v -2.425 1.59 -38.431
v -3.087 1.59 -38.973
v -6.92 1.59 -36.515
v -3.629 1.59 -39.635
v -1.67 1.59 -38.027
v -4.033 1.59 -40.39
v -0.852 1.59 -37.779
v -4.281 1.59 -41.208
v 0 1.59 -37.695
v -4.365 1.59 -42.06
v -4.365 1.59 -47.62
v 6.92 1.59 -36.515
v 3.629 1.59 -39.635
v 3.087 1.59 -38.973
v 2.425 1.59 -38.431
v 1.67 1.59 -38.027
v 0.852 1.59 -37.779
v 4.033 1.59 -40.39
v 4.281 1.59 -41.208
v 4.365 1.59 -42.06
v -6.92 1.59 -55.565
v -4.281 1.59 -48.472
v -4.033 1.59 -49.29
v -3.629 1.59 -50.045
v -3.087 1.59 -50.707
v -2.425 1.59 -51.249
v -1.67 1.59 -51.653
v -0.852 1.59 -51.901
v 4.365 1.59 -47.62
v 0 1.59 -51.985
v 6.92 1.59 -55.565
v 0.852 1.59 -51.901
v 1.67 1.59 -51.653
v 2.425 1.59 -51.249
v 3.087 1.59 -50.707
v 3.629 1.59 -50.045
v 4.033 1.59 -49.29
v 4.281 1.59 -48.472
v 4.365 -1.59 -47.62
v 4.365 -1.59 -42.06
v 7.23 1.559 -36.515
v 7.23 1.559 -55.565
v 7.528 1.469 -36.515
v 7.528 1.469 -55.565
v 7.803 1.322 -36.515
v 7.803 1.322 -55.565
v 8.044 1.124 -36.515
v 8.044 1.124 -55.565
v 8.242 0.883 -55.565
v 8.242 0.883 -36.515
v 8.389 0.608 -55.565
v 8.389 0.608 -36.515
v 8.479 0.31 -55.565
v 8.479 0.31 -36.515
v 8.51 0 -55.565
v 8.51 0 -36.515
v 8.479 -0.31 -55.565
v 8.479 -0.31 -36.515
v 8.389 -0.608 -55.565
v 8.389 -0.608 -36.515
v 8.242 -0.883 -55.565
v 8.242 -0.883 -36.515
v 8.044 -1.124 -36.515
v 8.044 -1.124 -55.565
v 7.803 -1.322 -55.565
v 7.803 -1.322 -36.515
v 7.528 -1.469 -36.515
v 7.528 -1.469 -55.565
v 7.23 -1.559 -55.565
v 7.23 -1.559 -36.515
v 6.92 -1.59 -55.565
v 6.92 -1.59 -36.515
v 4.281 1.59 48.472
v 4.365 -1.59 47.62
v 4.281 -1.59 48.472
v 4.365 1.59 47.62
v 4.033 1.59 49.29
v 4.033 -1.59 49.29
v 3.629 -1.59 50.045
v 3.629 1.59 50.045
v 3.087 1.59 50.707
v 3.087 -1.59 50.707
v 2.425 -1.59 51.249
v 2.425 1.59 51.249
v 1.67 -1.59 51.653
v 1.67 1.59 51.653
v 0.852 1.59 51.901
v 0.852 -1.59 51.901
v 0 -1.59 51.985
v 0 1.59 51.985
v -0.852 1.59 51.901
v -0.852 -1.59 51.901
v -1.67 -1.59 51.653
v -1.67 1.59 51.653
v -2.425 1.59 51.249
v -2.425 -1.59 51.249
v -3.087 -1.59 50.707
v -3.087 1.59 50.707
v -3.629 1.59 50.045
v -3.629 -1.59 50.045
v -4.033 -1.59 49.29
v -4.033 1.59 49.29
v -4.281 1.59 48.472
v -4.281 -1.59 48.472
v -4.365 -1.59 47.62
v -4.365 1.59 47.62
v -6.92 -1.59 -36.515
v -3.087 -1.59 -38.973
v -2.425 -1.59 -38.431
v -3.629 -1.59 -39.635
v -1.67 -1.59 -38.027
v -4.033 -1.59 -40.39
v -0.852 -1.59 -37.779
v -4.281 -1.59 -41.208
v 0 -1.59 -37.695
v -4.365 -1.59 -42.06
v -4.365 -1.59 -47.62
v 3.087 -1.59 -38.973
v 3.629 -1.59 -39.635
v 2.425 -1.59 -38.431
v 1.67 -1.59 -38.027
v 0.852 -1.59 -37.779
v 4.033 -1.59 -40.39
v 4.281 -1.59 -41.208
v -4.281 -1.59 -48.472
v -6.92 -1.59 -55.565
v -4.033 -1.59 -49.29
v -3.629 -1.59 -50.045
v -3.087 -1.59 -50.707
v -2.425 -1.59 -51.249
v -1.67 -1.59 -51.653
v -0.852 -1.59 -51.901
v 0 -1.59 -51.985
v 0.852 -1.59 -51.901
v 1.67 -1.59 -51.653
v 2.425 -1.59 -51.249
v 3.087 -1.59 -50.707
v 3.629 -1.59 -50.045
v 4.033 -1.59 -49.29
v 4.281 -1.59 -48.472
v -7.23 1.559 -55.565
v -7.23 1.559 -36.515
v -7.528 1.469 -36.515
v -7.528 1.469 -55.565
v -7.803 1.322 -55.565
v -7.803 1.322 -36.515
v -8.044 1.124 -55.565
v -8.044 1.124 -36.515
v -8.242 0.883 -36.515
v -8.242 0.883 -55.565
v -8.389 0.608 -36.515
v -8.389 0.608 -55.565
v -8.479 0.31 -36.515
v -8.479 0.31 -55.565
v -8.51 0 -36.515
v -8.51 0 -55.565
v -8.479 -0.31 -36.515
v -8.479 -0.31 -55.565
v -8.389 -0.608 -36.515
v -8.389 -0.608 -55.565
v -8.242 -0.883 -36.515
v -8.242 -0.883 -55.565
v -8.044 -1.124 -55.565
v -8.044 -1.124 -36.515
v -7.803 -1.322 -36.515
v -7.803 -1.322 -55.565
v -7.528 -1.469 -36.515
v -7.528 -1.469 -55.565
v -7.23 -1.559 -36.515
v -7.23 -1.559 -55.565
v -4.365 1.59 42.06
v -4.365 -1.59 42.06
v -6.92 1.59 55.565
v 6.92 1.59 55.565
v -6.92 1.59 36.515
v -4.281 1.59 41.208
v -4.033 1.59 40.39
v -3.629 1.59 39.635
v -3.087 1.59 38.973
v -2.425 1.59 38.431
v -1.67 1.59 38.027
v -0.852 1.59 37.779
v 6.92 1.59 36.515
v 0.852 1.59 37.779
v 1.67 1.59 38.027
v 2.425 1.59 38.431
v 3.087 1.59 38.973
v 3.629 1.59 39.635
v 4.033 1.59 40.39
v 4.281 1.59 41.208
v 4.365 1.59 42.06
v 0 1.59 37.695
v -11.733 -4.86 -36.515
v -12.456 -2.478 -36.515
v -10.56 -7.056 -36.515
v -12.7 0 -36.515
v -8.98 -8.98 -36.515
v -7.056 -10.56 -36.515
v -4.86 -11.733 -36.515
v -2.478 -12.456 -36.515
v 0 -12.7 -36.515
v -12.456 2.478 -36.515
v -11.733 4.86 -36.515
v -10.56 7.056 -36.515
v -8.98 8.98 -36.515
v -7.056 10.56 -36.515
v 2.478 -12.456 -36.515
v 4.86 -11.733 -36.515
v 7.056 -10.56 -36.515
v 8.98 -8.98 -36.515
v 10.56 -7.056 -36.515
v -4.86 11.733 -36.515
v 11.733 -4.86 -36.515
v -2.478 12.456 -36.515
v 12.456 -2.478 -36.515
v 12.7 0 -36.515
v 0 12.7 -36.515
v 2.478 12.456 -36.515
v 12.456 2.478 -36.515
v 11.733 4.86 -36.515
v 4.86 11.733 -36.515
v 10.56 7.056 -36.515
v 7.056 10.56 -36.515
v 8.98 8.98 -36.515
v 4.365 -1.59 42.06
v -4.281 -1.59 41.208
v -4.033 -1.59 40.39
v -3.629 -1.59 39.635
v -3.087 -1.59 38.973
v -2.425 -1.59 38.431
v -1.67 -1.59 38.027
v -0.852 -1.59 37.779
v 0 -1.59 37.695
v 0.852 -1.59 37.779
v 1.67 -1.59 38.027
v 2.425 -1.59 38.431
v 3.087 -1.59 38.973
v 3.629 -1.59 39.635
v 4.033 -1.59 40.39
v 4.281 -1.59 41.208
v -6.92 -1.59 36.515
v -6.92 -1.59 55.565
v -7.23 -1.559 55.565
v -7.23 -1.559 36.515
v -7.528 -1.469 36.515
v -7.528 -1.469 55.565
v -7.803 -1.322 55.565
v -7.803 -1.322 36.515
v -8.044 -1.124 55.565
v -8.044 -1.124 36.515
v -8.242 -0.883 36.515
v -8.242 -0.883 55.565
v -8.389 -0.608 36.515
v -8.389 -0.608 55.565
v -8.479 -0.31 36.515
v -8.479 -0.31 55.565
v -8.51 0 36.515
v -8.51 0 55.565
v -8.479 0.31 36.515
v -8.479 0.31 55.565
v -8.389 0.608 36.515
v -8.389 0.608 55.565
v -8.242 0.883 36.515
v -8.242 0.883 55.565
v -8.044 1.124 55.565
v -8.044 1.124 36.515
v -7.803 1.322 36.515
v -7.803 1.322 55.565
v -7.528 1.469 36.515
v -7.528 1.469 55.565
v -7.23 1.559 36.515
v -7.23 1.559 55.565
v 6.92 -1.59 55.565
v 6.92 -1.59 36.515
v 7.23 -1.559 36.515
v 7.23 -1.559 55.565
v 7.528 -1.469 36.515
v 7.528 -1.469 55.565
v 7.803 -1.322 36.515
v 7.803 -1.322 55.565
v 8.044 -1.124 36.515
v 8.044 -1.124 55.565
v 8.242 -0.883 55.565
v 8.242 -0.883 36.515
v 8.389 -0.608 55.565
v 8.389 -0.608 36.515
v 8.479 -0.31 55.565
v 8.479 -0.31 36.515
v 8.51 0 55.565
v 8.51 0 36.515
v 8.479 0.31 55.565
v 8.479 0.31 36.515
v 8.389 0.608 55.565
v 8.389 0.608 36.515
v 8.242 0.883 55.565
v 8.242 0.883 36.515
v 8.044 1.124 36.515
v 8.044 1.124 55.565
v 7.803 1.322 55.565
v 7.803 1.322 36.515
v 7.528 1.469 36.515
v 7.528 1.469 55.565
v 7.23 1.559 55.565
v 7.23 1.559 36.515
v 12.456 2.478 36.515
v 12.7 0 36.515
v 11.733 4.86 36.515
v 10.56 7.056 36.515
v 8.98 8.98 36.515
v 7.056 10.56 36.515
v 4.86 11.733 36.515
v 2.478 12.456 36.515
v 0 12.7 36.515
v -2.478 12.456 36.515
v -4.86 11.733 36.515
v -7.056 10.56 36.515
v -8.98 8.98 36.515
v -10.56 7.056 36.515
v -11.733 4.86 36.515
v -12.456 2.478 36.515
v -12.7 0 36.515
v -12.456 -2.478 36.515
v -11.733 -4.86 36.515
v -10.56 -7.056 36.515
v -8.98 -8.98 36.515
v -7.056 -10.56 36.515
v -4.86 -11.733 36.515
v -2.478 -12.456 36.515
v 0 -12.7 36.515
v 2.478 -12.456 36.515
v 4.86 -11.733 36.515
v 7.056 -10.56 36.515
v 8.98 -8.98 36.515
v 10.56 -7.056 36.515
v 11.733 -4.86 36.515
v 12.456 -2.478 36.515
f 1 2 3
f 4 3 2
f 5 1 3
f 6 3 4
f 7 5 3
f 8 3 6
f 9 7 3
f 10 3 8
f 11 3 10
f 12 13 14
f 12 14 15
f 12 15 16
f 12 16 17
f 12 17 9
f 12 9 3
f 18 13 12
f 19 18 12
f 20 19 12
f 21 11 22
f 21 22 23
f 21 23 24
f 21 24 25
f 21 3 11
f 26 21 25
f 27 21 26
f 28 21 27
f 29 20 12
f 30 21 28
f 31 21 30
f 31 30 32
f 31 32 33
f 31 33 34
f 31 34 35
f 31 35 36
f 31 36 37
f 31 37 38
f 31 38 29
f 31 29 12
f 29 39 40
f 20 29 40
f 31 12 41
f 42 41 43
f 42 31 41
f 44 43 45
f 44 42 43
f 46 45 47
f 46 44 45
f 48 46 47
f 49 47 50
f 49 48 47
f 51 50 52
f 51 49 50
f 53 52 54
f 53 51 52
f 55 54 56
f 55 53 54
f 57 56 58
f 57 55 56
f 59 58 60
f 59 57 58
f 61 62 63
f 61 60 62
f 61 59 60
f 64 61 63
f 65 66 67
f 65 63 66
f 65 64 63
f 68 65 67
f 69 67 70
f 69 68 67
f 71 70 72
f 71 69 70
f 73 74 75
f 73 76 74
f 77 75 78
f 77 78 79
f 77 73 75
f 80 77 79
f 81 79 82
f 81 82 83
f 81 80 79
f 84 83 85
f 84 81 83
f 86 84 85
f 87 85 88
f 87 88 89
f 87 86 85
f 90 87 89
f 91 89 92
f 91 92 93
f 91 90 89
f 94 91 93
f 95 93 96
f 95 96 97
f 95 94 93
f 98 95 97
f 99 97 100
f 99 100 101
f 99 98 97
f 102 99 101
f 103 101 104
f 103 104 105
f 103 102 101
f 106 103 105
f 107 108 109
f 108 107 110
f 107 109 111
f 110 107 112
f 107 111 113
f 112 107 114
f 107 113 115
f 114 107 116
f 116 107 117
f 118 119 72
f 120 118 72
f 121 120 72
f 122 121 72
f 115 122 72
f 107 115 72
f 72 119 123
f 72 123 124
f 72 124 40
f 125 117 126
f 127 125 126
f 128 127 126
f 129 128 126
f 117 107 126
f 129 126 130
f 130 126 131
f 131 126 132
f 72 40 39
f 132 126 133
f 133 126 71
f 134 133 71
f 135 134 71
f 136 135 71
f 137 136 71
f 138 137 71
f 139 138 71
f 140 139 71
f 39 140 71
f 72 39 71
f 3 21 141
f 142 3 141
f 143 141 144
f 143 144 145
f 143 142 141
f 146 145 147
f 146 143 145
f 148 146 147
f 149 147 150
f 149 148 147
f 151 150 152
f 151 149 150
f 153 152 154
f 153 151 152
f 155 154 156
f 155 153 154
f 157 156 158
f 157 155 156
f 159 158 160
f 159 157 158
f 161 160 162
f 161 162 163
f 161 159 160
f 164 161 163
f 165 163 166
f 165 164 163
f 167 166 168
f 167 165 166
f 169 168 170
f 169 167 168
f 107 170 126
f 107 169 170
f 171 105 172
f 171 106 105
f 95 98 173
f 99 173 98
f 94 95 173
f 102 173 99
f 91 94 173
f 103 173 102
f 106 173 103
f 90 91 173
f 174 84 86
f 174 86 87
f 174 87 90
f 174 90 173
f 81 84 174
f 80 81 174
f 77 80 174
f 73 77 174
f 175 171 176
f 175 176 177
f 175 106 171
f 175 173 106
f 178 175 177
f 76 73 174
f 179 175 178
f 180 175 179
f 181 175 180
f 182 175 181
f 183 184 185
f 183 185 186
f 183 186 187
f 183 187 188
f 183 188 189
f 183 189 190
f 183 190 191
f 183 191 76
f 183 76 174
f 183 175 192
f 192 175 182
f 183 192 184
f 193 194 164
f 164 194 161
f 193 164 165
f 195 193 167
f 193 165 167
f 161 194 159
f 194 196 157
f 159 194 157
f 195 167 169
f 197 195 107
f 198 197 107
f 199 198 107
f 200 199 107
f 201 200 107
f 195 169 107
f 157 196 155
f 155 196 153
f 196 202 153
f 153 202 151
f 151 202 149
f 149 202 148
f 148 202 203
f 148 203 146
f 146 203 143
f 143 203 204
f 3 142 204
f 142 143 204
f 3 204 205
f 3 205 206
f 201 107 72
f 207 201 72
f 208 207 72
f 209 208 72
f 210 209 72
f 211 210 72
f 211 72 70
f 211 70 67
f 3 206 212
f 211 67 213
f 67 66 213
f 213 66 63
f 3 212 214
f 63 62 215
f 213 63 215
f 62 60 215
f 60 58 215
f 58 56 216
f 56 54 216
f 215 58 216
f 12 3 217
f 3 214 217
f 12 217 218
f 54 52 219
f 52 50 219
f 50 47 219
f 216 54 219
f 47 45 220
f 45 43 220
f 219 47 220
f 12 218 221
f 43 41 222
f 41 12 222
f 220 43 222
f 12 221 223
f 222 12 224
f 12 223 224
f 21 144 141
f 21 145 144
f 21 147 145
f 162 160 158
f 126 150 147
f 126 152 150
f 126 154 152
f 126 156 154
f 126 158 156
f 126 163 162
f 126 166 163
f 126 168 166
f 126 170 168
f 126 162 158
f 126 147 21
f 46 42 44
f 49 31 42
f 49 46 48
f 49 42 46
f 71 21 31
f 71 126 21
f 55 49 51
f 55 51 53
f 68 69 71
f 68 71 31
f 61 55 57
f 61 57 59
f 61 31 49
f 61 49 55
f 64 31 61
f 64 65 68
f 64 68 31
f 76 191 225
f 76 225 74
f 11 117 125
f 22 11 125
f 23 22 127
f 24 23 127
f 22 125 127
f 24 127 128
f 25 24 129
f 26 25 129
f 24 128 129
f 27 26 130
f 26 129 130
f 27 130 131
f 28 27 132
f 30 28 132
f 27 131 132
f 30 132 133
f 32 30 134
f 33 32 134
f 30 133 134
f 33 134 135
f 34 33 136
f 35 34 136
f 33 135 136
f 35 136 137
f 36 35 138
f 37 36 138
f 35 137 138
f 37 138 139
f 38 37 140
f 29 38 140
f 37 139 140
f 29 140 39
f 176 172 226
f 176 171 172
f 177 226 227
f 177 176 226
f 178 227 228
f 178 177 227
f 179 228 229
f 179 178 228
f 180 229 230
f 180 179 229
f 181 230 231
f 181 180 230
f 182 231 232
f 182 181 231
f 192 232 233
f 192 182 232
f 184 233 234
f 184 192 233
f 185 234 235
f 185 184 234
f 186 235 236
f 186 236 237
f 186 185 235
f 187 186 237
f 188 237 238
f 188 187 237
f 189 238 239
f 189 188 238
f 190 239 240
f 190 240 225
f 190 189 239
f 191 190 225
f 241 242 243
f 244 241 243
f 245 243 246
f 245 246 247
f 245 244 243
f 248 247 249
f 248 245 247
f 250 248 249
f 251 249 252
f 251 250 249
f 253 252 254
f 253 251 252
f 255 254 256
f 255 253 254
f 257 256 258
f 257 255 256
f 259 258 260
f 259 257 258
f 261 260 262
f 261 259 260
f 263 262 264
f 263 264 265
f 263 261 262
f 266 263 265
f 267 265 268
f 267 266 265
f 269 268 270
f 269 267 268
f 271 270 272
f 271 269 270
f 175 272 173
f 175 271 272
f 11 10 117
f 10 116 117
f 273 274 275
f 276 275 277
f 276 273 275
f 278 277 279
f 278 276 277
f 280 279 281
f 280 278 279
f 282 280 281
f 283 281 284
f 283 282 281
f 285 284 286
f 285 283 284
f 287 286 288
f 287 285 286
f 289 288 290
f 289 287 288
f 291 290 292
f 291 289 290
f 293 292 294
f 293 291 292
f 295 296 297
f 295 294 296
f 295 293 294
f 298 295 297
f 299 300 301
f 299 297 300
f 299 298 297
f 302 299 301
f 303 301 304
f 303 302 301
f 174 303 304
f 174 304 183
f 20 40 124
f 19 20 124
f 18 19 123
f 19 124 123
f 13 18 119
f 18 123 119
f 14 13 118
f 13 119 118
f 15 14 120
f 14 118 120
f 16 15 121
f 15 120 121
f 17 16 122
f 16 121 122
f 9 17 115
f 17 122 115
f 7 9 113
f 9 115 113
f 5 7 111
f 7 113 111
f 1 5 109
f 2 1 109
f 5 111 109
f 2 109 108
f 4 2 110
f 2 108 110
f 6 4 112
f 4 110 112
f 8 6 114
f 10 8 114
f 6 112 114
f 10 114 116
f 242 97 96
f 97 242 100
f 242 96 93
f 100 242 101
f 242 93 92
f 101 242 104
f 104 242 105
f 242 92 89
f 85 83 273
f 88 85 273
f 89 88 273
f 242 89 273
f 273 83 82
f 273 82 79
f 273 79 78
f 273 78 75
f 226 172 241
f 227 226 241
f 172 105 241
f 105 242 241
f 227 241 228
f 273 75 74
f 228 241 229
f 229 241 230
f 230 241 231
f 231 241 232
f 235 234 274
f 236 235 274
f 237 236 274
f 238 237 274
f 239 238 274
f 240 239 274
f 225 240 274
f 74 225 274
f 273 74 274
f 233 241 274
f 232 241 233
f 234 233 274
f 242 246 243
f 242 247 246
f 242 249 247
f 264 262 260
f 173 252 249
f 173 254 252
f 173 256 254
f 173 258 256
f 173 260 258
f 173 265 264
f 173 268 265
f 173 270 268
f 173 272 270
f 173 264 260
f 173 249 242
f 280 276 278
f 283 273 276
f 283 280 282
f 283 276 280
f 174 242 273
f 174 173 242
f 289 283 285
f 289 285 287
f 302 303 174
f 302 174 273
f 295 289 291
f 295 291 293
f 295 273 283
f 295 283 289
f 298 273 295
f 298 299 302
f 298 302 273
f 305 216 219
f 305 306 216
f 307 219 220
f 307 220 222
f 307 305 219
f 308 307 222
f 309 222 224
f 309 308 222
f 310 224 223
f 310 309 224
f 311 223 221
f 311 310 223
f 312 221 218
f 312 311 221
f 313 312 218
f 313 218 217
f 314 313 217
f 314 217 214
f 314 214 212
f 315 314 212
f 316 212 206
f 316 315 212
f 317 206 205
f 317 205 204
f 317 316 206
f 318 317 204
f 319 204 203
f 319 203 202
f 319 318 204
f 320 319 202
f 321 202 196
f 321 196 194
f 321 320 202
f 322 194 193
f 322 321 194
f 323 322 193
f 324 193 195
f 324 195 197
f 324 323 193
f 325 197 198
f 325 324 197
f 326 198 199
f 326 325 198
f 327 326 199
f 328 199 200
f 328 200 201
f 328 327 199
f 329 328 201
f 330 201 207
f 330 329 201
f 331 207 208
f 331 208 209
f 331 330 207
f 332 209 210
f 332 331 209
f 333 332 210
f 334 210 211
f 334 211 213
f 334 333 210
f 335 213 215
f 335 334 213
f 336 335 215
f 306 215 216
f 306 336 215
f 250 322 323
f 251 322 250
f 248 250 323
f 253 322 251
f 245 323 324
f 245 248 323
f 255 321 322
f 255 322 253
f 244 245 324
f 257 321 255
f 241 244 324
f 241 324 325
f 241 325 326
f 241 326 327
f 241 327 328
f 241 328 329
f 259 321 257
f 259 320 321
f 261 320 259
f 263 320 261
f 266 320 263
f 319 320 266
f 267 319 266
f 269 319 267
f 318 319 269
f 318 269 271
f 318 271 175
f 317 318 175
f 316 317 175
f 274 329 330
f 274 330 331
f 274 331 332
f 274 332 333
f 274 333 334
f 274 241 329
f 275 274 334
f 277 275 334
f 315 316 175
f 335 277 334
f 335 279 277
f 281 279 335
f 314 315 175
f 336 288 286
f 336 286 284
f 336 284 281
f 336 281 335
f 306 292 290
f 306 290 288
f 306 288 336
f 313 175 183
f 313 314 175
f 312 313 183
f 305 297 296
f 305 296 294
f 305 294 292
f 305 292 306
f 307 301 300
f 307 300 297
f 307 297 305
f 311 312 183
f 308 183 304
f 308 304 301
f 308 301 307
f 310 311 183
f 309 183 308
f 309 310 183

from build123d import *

# Parameters (mm, degrees)
SKETCH1_R           = 12.7
BOSS_EXTRUDE1_DEPTH = 36.515
SKETCH2_W           = 17.02
SKETCH2_H           = 19.05
BOSS_EXTRUDE2_DEPTH = 1.59
FILLET1_RADIUS      = 1.59
FILLET1_LENGTH      = 19.05
FILLET2_RADIUS      = 1.59
FILLET2_LENGTH      = 19.05
FILLET3_RADIUS      = 1.59
FILLET3_LENGTH      = 19.05
FILLET4_RADIUS      = 1.59
FILLET4_LENGTH      = 19.05


with BuildPart() as part:
    # Sketch1 → Boss-Extrude1 (new, symmetric)
    with BuildSketch(Plane.XY):
        Circle(SKETCH1_R)
    extrude(amount=BOSS_EXTRUDE1_DEPTH, both=True)

    # Sketch2 → Boss-Extrude2 (add, symmetric)
    # profile 1 of 2: a face of its own
    with BuildSketch(Plane(origin=(0, 0, 0), x_dir=(1, 0, 0), z_dir=(0, 1, 0))):
        with Locations((0, 46.04)):
            Rectangle(SKETCH2_W, SKETCH2_H)
        with BuildLine():
            Line((-4.365, 42.06), (-4.365, 47.62))
            ThreePointArc((-4.365, 47.62), (0, 51.985), (4.365, 47.62))
            Line((4.365, 47.62), (4.365, 42.06))
            ThreePointArc((4.365, 42.06), (0, 37.695), (-4.365, 42.06))
        make_face(mode=Mode.SUBTRACT)
    # profile 2 of 2: a face of its own
    with BuildSketch(Plane(origin=(0, 0, 0), x_dir=(1, 0, 0), z_dir=(0, 1, 0))):
        with Locations((0, -46.04)):
            Rectangle(SKETCH2_W, SKETCH2_H)
        with BuildLine():
            Line((4.365, -42.06), (4.365, -47.62))
            ThreePointArc((4.365, -47.62), (0, -51.985), (-4.365, -47.62))
            Line((-4.365, -47.62), (-4.365, -42.06))
            ThreePointArc((-4.365, -42.06), (0, -37.695), (4.365, -42.06))
        make_face(mode=Mode.SUBTRACT)
    extrude(amount=BOSS_EXTRUDE2_DEPTH, both=True)

    # Fillet1: full round fillet: the end face becomes a half cylinder, R = half its width
    fillet1_face = Plane((-8.51, 0, -46.04), x_dir=(0, 0, 1), z_dir=(-1, 0, 0))  # on the end face: x along it, z out of the body
    fillet1_slab = fillet1_face.offset(-FILLET1_RADIUS / 2) * Box(FILLET1_LENGTH, 2 * FILLET1_RADIUS, FILLET1_RADIUS, mode=Mode.PRIVATE)  # the body's end, R deep
    fillet1_round = Plane((-6.92, 0, -46.04), x_dir=(-1, 0, 0), z_dir=(0, 0, 1)) * Cylinder(FILLET1_RADIUS, FILLET1_LENGTH, mode=Mode.PRIVATE)  # its axis R under the face
    add(fillet1_slab - fillet1_round, mode=Mode.SUBTRACT)

    # Fillet2: full round fillet: the end face becomes a half cylinder, R = half its width
    fillet2_face = Plane((8.51, 0, -46.04), x_dir=(0, 0, -1), z_dir=(1, 0, 0))  # on the end face: x along it, z out of the body
    fillet2_slab = fillet2_face.offset(-FILLET2_RADIUS / 2) * Box(FILLET2_LENGTH, 2 * FILLET2_RADIUS, FILLET2_RADIUS, mode=Mode.PRIVATE)  # the body's end, R deep
    fillet2_round = Plane((6.92, 0, -46.04), x_dir=(1, 0, 0), z_dir=(0, 0, -1)) * Cylinder(FILLET2_RADIUS, FILLET2_LENGTH, mode=Mode.PRIVATE)  # its axis R under the face
    add(fillet2_slab - fillet2_round, mode=Mode.SUBTRACT)

    # Fillet3: full round fillet: the end face becomes a half cylinder, R = half its width
    fillet3_face = Plane((8.51, 0, 46.04), x_dir=(0, 0, 1), z_dir=(1, 0, 0))  # on the end face: x along it, z out of the body
    fillet3_slab = fillet3_face.offset(-FILLET3_RADIUS / 2) * Box(FILLET3_LENGTH, 2 * FILLET3_RADIUS, FILLET3_RADIUS, mode=Mode.PRIVATE)  # the body's end, R deep
    fillet3_round = Plane((6.92, 0, 46.04), x_dir=(1, 0, 0), z_dir=(0, 0, 1)) * Cylinder(FILLET3_RADIUS, FILLET3_LENGTH, mode=Mode.PRIVATE)  # its axis R under the face
    add(fillet3_slab - fillet3_round, mode=Mode.SUBTRACT)

    # Fillet4: full round fillet: the end face becomes a half cylinder, R = half its width
    fillet4_face = Plane((-8.51, 0, 46.04), x_dir=(0, 0, -1), z_dir=(-1, 0, 0))  # on the end face: x along it, z out of the body
    fillet4_slab = fillet4_face.offset(-FILLET4_RADIUS / 2) * Box(FILLET4_LENGTH, 2 * FILLET4_RADIUS, FILLET4_RADIUS, mode=Mode.PRIVATE)  # the body's end, R deep
    fillet4_round = Plane((-6.92, 0, 46.04), x_dir=(-1, 0, 0), z_dir=(0, 0, -1)) * Cylinder(FILLET4_RADIUS, FILLET4_LENGTH, mode=Mode.PRIVATE)  # its axis R under the face
    add(fillet4_slab - fillet4_round, mode=Mode.SUBTRACT)


solid = part.part
